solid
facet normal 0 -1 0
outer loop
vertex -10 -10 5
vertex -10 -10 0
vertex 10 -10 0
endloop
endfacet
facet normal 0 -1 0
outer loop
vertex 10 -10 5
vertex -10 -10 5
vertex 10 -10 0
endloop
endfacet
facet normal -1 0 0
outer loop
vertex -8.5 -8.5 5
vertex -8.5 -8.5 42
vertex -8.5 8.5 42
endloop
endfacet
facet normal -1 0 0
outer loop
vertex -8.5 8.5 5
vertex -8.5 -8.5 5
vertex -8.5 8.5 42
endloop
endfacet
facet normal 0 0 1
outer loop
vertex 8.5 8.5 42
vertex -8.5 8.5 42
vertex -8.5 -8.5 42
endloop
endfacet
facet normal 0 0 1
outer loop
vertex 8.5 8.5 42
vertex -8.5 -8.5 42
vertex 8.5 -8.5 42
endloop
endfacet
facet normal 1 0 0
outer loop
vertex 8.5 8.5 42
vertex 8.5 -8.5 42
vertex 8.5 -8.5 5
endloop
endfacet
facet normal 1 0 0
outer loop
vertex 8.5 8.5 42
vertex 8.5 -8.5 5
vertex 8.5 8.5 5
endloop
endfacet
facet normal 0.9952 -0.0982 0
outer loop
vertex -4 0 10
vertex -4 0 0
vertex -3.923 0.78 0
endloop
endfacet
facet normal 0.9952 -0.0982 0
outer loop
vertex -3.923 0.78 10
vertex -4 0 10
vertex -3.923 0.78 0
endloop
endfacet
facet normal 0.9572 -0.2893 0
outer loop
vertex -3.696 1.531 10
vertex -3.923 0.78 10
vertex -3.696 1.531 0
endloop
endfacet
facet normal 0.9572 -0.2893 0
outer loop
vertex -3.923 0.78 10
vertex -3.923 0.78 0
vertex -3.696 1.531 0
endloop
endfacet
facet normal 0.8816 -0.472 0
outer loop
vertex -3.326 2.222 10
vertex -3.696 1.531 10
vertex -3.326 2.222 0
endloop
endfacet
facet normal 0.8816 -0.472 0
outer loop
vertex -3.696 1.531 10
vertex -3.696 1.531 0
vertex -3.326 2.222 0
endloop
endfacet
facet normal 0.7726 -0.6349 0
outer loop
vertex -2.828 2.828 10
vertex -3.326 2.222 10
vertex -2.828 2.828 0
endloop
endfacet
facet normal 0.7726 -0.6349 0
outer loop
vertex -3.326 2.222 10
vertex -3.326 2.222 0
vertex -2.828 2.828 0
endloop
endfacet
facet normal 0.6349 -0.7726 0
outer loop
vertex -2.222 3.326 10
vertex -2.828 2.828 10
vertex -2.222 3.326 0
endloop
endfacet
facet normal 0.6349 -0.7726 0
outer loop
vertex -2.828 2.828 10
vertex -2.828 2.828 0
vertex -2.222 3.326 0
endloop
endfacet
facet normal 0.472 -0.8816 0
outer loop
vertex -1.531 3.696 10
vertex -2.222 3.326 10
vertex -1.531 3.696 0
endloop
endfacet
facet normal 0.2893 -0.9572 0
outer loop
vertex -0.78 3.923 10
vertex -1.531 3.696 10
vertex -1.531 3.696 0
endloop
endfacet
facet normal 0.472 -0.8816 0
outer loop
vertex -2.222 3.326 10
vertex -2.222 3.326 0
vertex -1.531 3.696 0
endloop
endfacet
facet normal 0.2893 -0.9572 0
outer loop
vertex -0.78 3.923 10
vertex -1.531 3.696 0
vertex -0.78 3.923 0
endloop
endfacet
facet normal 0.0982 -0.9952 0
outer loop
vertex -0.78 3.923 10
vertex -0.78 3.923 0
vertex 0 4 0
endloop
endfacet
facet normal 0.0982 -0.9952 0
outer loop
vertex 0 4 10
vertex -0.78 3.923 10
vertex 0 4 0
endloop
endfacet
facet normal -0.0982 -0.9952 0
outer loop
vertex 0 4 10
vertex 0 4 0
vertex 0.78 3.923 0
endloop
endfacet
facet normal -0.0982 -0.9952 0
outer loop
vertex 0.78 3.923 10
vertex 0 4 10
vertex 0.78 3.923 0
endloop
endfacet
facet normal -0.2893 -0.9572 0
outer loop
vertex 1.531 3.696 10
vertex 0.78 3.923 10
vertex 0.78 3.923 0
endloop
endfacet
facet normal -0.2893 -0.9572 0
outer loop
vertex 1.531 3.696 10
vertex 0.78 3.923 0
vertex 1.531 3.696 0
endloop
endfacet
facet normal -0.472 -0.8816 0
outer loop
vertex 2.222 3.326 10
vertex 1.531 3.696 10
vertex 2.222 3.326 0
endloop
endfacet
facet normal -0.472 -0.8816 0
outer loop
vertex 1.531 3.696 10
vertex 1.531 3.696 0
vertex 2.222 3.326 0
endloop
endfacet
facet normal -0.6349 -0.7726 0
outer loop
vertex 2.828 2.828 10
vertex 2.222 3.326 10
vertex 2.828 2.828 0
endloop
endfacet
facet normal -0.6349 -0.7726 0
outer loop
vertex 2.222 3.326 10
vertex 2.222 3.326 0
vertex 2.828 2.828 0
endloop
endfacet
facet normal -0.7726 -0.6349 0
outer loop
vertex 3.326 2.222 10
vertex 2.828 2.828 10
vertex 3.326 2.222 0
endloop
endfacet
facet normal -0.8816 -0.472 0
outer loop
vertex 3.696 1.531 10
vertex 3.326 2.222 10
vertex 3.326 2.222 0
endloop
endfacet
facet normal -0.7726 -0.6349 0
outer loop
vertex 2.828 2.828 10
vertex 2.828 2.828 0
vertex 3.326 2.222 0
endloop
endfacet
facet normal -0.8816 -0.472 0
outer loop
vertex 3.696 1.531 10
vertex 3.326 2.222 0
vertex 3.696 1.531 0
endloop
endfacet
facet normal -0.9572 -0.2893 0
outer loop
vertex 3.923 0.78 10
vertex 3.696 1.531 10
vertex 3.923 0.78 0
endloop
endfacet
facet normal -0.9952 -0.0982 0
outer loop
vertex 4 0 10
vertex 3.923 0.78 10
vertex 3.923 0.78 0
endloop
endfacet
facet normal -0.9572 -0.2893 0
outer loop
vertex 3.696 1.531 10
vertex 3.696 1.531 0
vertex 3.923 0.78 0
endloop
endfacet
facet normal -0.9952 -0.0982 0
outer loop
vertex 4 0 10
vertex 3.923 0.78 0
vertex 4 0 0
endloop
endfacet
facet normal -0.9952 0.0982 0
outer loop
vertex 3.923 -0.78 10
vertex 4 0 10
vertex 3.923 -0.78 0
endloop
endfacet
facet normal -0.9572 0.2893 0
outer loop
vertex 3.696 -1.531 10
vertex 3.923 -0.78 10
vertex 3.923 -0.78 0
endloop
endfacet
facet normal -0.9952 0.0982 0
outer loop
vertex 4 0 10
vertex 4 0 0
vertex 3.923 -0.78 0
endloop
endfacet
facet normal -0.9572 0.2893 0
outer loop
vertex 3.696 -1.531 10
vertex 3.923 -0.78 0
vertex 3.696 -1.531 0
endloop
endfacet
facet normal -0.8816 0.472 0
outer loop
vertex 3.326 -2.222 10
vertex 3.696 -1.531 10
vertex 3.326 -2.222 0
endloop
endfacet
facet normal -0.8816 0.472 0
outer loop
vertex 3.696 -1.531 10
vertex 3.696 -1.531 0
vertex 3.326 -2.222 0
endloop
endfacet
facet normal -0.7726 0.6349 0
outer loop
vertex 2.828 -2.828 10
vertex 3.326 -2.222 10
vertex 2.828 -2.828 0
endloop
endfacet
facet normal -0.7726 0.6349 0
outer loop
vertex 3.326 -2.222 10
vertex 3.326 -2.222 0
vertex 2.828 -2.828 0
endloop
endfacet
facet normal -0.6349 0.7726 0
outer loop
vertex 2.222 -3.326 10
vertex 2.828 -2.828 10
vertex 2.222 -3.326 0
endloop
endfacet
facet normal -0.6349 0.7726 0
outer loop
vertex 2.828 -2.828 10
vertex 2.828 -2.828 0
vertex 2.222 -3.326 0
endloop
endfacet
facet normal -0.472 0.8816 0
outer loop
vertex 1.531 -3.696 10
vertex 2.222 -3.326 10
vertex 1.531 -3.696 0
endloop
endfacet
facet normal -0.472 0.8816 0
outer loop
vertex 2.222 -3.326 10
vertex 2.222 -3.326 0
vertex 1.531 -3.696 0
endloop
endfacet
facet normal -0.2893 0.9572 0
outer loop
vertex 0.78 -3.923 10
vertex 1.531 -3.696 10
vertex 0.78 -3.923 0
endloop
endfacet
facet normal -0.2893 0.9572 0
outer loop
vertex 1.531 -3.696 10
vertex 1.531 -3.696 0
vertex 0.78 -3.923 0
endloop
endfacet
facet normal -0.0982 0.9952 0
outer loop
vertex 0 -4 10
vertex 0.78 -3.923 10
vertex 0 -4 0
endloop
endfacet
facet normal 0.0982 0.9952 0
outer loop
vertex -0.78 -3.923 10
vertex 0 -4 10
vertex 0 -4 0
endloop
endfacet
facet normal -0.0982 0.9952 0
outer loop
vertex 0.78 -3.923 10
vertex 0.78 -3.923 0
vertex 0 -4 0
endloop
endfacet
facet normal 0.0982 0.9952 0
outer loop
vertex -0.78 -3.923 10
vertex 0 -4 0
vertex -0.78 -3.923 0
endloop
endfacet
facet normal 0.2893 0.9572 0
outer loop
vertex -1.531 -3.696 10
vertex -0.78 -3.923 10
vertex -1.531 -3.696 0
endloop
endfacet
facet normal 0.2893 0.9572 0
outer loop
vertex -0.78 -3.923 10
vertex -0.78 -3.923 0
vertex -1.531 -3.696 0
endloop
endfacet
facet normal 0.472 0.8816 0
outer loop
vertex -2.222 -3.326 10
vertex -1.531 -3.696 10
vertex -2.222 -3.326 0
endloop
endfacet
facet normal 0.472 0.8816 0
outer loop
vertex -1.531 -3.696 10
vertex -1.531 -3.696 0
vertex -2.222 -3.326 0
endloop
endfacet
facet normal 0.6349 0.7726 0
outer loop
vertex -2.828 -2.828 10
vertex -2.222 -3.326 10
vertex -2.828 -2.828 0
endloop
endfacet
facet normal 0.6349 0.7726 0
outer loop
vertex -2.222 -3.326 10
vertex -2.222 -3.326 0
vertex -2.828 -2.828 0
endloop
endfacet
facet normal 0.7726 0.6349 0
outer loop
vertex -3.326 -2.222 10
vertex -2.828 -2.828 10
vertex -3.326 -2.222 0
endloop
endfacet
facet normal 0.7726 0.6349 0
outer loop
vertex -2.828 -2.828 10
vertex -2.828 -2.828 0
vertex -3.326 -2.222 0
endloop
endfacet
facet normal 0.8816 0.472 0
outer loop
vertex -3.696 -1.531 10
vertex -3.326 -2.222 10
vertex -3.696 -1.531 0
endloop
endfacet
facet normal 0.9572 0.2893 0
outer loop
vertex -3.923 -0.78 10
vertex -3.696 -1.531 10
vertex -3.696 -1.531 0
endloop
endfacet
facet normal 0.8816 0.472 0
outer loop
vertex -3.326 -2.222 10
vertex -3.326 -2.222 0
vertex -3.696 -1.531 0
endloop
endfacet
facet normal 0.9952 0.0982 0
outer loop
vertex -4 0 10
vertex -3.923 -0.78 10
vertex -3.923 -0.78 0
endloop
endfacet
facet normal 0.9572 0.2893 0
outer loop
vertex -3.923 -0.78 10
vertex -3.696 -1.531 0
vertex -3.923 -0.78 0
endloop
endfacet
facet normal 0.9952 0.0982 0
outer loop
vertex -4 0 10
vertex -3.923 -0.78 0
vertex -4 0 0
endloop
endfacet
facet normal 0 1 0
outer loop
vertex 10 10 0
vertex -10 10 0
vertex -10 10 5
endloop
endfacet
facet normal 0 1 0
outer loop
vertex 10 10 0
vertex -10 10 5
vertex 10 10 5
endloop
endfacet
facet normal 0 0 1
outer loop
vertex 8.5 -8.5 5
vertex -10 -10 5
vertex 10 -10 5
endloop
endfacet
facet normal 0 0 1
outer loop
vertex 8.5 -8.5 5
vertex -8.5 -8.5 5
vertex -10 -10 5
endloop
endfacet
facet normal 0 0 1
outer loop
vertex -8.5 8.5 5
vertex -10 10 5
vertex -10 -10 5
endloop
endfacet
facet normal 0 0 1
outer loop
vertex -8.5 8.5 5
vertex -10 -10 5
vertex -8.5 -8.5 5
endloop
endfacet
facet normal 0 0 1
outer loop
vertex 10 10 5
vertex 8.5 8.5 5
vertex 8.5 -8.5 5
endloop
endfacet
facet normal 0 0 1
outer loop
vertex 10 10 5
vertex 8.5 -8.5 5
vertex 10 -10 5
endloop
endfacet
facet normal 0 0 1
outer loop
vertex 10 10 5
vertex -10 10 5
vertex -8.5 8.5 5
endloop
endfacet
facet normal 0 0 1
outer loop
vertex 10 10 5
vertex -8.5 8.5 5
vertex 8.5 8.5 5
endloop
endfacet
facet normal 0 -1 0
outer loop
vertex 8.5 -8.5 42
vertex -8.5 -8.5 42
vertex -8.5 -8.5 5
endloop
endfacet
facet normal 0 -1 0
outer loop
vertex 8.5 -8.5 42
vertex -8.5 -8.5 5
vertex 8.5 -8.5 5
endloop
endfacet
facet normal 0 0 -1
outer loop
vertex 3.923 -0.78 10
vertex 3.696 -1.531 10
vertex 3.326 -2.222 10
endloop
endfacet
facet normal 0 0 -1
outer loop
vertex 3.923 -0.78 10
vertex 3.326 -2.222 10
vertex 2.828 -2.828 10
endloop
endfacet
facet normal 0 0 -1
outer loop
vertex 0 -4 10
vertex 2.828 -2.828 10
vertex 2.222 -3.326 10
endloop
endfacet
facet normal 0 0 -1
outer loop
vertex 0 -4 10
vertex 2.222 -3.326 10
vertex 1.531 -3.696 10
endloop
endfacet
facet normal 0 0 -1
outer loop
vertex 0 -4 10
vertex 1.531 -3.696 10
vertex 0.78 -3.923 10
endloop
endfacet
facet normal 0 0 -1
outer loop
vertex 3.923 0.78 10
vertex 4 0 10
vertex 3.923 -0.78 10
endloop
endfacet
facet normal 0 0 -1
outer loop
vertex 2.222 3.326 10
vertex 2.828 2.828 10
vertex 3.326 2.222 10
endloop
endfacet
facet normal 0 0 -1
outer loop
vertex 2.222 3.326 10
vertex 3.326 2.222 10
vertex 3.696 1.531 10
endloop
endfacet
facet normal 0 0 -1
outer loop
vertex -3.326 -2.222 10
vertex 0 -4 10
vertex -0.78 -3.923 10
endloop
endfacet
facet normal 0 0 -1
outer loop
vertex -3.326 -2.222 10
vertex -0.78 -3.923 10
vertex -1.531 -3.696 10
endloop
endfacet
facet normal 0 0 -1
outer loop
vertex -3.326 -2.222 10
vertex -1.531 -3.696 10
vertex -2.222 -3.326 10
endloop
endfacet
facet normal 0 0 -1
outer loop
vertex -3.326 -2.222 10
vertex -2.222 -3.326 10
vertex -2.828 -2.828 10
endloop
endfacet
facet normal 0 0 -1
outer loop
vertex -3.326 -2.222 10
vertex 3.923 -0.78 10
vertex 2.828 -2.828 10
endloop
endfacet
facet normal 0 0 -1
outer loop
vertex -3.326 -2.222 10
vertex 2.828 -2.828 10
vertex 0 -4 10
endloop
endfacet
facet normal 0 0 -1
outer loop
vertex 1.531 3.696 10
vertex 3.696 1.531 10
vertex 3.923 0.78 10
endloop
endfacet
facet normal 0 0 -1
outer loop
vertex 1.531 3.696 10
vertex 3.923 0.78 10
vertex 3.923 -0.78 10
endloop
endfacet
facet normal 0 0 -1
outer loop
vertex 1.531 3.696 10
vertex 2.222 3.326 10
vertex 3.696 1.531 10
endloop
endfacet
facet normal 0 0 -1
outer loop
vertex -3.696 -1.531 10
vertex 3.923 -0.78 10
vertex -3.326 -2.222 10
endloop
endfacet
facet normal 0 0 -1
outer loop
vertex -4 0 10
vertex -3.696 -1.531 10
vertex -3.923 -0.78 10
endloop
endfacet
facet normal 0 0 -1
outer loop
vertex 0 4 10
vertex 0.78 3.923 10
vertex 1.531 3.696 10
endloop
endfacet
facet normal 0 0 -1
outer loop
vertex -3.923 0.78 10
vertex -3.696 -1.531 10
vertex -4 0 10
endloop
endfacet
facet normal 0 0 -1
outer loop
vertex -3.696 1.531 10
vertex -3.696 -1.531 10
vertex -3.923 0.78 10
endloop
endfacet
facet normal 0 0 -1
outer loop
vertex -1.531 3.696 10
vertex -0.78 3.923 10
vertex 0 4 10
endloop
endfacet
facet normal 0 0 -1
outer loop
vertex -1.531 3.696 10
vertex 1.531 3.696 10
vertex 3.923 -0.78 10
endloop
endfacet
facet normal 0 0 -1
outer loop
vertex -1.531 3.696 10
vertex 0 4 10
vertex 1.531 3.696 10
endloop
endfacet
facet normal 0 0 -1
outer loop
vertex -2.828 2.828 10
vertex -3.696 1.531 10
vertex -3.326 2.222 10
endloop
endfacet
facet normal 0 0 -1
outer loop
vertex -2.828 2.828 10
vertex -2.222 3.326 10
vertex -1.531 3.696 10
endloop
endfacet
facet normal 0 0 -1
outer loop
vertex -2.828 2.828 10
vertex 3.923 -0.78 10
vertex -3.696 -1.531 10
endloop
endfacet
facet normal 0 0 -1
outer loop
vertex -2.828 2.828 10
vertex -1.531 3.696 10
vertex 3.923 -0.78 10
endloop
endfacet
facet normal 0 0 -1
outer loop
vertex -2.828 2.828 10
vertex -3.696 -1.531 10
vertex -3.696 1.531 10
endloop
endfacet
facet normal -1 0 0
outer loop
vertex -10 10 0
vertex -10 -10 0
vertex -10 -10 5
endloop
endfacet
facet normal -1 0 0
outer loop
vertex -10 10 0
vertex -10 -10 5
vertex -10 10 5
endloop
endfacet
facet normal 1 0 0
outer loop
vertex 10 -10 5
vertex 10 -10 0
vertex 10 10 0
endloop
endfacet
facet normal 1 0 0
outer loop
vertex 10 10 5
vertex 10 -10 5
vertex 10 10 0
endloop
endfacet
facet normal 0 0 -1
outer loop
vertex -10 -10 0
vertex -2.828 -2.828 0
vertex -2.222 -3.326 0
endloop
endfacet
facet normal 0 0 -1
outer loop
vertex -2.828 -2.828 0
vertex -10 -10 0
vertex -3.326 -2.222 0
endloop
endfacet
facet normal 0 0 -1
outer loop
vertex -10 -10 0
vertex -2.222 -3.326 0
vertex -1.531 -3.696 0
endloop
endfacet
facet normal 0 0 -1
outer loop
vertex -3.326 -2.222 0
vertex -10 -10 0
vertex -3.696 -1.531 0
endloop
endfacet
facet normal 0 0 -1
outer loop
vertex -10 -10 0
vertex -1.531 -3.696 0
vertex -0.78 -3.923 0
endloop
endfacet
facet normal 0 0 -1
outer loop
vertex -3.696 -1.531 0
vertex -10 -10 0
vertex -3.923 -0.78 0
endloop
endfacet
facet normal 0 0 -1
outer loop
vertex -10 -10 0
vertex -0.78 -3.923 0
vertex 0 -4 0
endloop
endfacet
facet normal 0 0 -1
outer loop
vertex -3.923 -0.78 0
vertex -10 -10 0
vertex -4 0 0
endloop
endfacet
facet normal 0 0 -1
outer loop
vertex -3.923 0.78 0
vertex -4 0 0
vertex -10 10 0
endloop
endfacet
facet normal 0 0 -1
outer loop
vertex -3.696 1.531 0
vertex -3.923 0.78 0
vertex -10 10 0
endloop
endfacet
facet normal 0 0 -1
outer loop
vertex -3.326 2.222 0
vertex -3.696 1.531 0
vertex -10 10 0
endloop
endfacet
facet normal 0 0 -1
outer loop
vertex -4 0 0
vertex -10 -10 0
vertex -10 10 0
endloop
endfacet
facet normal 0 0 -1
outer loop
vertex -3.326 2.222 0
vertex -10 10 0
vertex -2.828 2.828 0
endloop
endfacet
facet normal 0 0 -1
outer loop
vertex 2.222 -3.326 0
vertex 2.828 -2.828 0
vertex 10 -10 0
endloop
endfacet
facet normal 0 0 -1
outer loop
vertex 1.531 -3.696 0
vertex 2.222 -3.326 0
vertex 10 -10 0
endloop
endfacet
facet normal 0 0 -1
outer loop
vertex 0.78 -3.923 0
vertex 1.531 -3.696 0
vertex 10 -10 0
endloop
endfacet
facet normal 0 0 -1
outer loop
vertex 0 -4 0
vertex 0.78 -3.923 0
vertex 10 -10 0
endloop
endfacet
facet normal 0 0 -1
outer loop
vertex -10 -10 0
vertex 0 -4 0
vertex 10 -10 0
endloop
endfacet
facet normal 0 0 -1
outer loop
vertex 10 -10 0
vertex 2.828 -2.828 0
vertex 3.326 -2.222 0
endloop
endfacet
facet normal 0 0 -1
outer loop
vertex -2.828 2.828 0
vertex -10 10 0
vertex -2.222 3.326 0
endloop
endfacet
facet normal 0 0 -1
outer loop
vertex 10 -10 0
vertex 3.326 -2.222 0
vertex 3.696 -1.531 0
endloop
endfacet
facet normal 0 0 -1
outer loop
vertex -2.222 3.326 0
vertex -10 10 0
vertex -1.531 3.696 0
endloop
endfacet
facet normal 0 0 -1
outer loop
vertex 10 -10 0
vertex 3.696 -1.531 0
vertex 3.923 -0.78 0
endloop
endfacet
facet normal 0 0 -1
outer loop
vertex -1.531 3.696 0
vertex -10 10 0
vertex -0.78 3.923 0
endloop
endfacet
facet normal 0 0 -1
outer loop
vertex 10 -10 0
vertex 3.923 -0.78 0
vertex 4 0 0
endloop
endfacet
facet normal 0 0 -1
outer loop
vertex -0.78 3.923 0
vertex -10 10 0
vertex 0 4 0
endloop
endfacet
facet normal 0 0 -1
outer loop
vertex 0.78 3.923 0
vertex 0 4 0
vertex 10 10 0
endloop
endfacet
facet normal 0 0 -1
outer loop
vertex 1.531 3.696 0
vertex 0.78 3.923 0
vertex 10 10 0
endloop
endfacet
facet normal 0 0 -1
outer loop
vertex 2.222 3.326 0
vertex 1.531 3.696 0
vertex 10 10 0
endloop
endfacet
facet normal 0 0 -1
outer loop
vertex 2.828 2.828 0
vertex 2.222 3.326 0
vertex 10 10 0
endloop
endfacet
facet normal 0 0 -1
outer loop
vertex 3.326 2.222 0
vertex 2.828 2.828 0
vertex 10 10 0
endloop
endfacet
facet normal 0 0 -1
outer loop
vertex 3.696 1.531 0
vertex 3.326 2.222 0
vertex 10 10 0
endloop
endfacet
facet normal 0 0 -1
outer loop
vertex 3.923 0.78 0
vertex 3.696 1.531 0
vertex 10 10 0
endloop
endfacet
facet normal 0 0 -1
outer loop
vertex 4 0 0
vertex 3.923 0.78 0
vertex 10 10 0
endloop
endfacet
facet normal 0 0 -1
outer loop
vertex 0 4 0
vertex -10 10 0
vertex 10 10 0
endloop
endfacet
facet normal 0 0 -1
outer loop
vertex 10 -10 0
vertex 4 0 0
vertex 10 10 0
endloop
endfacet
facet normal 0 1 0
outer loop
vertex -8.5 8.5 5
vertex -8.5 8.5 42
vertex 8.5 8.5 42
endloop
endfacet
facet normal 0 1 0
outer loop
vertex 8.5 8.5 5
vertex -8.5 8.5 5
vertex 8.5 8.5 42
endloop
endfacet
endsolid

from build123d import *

# Parameters (mm, degrees)
SKETCH_1_W          = 20
SKETCH_1_H          = 20
EXTRUDE_1_DEPTH     = 5
SKETCH_2_W          = 17
SKETCH_2_H          = 17
EXTRUDE_2_DEPTH     = 37
SKETCH_3_R          = 4
CUT_EXTRUDE_1_DEPTH = 10


with BuildPart() as part:
    # ｽｹｯﾁ1 → ﾎﾞｽ - 押し出し1 (new body)
    with BuildSketch(Plane.XY):
        Rectangle(SKETCH_1_W, SKETCH_1_H)
    extrude(amount=EXTRUDE_1_DEPTH)

    # ｽｹｯﾁ2 → ﾎﾞｽ - 押し出し2 (add)
    with BuildSketch(Plane.XY.offset(5)):
        Rectangle(SKETCH_2_W, SKETCH_2_H)
    extrude(amount=EXTRUDE_2_DEPTH)

    # ｽｹｯﾁ3 → ｶｯﾄ - 押し出し1 (cut)
    with BuildSketch(Plane(origin=(0, 0, 0), x_dir=(-1, 0, 0), z_dir=(0, 0, -1))):
        Circle(SKETCH_3_R)
    extrude(amount=-CUT_EXTRUDE_1_DEPTH, mode=Mode.SUBTRACT)


solid = part.part
